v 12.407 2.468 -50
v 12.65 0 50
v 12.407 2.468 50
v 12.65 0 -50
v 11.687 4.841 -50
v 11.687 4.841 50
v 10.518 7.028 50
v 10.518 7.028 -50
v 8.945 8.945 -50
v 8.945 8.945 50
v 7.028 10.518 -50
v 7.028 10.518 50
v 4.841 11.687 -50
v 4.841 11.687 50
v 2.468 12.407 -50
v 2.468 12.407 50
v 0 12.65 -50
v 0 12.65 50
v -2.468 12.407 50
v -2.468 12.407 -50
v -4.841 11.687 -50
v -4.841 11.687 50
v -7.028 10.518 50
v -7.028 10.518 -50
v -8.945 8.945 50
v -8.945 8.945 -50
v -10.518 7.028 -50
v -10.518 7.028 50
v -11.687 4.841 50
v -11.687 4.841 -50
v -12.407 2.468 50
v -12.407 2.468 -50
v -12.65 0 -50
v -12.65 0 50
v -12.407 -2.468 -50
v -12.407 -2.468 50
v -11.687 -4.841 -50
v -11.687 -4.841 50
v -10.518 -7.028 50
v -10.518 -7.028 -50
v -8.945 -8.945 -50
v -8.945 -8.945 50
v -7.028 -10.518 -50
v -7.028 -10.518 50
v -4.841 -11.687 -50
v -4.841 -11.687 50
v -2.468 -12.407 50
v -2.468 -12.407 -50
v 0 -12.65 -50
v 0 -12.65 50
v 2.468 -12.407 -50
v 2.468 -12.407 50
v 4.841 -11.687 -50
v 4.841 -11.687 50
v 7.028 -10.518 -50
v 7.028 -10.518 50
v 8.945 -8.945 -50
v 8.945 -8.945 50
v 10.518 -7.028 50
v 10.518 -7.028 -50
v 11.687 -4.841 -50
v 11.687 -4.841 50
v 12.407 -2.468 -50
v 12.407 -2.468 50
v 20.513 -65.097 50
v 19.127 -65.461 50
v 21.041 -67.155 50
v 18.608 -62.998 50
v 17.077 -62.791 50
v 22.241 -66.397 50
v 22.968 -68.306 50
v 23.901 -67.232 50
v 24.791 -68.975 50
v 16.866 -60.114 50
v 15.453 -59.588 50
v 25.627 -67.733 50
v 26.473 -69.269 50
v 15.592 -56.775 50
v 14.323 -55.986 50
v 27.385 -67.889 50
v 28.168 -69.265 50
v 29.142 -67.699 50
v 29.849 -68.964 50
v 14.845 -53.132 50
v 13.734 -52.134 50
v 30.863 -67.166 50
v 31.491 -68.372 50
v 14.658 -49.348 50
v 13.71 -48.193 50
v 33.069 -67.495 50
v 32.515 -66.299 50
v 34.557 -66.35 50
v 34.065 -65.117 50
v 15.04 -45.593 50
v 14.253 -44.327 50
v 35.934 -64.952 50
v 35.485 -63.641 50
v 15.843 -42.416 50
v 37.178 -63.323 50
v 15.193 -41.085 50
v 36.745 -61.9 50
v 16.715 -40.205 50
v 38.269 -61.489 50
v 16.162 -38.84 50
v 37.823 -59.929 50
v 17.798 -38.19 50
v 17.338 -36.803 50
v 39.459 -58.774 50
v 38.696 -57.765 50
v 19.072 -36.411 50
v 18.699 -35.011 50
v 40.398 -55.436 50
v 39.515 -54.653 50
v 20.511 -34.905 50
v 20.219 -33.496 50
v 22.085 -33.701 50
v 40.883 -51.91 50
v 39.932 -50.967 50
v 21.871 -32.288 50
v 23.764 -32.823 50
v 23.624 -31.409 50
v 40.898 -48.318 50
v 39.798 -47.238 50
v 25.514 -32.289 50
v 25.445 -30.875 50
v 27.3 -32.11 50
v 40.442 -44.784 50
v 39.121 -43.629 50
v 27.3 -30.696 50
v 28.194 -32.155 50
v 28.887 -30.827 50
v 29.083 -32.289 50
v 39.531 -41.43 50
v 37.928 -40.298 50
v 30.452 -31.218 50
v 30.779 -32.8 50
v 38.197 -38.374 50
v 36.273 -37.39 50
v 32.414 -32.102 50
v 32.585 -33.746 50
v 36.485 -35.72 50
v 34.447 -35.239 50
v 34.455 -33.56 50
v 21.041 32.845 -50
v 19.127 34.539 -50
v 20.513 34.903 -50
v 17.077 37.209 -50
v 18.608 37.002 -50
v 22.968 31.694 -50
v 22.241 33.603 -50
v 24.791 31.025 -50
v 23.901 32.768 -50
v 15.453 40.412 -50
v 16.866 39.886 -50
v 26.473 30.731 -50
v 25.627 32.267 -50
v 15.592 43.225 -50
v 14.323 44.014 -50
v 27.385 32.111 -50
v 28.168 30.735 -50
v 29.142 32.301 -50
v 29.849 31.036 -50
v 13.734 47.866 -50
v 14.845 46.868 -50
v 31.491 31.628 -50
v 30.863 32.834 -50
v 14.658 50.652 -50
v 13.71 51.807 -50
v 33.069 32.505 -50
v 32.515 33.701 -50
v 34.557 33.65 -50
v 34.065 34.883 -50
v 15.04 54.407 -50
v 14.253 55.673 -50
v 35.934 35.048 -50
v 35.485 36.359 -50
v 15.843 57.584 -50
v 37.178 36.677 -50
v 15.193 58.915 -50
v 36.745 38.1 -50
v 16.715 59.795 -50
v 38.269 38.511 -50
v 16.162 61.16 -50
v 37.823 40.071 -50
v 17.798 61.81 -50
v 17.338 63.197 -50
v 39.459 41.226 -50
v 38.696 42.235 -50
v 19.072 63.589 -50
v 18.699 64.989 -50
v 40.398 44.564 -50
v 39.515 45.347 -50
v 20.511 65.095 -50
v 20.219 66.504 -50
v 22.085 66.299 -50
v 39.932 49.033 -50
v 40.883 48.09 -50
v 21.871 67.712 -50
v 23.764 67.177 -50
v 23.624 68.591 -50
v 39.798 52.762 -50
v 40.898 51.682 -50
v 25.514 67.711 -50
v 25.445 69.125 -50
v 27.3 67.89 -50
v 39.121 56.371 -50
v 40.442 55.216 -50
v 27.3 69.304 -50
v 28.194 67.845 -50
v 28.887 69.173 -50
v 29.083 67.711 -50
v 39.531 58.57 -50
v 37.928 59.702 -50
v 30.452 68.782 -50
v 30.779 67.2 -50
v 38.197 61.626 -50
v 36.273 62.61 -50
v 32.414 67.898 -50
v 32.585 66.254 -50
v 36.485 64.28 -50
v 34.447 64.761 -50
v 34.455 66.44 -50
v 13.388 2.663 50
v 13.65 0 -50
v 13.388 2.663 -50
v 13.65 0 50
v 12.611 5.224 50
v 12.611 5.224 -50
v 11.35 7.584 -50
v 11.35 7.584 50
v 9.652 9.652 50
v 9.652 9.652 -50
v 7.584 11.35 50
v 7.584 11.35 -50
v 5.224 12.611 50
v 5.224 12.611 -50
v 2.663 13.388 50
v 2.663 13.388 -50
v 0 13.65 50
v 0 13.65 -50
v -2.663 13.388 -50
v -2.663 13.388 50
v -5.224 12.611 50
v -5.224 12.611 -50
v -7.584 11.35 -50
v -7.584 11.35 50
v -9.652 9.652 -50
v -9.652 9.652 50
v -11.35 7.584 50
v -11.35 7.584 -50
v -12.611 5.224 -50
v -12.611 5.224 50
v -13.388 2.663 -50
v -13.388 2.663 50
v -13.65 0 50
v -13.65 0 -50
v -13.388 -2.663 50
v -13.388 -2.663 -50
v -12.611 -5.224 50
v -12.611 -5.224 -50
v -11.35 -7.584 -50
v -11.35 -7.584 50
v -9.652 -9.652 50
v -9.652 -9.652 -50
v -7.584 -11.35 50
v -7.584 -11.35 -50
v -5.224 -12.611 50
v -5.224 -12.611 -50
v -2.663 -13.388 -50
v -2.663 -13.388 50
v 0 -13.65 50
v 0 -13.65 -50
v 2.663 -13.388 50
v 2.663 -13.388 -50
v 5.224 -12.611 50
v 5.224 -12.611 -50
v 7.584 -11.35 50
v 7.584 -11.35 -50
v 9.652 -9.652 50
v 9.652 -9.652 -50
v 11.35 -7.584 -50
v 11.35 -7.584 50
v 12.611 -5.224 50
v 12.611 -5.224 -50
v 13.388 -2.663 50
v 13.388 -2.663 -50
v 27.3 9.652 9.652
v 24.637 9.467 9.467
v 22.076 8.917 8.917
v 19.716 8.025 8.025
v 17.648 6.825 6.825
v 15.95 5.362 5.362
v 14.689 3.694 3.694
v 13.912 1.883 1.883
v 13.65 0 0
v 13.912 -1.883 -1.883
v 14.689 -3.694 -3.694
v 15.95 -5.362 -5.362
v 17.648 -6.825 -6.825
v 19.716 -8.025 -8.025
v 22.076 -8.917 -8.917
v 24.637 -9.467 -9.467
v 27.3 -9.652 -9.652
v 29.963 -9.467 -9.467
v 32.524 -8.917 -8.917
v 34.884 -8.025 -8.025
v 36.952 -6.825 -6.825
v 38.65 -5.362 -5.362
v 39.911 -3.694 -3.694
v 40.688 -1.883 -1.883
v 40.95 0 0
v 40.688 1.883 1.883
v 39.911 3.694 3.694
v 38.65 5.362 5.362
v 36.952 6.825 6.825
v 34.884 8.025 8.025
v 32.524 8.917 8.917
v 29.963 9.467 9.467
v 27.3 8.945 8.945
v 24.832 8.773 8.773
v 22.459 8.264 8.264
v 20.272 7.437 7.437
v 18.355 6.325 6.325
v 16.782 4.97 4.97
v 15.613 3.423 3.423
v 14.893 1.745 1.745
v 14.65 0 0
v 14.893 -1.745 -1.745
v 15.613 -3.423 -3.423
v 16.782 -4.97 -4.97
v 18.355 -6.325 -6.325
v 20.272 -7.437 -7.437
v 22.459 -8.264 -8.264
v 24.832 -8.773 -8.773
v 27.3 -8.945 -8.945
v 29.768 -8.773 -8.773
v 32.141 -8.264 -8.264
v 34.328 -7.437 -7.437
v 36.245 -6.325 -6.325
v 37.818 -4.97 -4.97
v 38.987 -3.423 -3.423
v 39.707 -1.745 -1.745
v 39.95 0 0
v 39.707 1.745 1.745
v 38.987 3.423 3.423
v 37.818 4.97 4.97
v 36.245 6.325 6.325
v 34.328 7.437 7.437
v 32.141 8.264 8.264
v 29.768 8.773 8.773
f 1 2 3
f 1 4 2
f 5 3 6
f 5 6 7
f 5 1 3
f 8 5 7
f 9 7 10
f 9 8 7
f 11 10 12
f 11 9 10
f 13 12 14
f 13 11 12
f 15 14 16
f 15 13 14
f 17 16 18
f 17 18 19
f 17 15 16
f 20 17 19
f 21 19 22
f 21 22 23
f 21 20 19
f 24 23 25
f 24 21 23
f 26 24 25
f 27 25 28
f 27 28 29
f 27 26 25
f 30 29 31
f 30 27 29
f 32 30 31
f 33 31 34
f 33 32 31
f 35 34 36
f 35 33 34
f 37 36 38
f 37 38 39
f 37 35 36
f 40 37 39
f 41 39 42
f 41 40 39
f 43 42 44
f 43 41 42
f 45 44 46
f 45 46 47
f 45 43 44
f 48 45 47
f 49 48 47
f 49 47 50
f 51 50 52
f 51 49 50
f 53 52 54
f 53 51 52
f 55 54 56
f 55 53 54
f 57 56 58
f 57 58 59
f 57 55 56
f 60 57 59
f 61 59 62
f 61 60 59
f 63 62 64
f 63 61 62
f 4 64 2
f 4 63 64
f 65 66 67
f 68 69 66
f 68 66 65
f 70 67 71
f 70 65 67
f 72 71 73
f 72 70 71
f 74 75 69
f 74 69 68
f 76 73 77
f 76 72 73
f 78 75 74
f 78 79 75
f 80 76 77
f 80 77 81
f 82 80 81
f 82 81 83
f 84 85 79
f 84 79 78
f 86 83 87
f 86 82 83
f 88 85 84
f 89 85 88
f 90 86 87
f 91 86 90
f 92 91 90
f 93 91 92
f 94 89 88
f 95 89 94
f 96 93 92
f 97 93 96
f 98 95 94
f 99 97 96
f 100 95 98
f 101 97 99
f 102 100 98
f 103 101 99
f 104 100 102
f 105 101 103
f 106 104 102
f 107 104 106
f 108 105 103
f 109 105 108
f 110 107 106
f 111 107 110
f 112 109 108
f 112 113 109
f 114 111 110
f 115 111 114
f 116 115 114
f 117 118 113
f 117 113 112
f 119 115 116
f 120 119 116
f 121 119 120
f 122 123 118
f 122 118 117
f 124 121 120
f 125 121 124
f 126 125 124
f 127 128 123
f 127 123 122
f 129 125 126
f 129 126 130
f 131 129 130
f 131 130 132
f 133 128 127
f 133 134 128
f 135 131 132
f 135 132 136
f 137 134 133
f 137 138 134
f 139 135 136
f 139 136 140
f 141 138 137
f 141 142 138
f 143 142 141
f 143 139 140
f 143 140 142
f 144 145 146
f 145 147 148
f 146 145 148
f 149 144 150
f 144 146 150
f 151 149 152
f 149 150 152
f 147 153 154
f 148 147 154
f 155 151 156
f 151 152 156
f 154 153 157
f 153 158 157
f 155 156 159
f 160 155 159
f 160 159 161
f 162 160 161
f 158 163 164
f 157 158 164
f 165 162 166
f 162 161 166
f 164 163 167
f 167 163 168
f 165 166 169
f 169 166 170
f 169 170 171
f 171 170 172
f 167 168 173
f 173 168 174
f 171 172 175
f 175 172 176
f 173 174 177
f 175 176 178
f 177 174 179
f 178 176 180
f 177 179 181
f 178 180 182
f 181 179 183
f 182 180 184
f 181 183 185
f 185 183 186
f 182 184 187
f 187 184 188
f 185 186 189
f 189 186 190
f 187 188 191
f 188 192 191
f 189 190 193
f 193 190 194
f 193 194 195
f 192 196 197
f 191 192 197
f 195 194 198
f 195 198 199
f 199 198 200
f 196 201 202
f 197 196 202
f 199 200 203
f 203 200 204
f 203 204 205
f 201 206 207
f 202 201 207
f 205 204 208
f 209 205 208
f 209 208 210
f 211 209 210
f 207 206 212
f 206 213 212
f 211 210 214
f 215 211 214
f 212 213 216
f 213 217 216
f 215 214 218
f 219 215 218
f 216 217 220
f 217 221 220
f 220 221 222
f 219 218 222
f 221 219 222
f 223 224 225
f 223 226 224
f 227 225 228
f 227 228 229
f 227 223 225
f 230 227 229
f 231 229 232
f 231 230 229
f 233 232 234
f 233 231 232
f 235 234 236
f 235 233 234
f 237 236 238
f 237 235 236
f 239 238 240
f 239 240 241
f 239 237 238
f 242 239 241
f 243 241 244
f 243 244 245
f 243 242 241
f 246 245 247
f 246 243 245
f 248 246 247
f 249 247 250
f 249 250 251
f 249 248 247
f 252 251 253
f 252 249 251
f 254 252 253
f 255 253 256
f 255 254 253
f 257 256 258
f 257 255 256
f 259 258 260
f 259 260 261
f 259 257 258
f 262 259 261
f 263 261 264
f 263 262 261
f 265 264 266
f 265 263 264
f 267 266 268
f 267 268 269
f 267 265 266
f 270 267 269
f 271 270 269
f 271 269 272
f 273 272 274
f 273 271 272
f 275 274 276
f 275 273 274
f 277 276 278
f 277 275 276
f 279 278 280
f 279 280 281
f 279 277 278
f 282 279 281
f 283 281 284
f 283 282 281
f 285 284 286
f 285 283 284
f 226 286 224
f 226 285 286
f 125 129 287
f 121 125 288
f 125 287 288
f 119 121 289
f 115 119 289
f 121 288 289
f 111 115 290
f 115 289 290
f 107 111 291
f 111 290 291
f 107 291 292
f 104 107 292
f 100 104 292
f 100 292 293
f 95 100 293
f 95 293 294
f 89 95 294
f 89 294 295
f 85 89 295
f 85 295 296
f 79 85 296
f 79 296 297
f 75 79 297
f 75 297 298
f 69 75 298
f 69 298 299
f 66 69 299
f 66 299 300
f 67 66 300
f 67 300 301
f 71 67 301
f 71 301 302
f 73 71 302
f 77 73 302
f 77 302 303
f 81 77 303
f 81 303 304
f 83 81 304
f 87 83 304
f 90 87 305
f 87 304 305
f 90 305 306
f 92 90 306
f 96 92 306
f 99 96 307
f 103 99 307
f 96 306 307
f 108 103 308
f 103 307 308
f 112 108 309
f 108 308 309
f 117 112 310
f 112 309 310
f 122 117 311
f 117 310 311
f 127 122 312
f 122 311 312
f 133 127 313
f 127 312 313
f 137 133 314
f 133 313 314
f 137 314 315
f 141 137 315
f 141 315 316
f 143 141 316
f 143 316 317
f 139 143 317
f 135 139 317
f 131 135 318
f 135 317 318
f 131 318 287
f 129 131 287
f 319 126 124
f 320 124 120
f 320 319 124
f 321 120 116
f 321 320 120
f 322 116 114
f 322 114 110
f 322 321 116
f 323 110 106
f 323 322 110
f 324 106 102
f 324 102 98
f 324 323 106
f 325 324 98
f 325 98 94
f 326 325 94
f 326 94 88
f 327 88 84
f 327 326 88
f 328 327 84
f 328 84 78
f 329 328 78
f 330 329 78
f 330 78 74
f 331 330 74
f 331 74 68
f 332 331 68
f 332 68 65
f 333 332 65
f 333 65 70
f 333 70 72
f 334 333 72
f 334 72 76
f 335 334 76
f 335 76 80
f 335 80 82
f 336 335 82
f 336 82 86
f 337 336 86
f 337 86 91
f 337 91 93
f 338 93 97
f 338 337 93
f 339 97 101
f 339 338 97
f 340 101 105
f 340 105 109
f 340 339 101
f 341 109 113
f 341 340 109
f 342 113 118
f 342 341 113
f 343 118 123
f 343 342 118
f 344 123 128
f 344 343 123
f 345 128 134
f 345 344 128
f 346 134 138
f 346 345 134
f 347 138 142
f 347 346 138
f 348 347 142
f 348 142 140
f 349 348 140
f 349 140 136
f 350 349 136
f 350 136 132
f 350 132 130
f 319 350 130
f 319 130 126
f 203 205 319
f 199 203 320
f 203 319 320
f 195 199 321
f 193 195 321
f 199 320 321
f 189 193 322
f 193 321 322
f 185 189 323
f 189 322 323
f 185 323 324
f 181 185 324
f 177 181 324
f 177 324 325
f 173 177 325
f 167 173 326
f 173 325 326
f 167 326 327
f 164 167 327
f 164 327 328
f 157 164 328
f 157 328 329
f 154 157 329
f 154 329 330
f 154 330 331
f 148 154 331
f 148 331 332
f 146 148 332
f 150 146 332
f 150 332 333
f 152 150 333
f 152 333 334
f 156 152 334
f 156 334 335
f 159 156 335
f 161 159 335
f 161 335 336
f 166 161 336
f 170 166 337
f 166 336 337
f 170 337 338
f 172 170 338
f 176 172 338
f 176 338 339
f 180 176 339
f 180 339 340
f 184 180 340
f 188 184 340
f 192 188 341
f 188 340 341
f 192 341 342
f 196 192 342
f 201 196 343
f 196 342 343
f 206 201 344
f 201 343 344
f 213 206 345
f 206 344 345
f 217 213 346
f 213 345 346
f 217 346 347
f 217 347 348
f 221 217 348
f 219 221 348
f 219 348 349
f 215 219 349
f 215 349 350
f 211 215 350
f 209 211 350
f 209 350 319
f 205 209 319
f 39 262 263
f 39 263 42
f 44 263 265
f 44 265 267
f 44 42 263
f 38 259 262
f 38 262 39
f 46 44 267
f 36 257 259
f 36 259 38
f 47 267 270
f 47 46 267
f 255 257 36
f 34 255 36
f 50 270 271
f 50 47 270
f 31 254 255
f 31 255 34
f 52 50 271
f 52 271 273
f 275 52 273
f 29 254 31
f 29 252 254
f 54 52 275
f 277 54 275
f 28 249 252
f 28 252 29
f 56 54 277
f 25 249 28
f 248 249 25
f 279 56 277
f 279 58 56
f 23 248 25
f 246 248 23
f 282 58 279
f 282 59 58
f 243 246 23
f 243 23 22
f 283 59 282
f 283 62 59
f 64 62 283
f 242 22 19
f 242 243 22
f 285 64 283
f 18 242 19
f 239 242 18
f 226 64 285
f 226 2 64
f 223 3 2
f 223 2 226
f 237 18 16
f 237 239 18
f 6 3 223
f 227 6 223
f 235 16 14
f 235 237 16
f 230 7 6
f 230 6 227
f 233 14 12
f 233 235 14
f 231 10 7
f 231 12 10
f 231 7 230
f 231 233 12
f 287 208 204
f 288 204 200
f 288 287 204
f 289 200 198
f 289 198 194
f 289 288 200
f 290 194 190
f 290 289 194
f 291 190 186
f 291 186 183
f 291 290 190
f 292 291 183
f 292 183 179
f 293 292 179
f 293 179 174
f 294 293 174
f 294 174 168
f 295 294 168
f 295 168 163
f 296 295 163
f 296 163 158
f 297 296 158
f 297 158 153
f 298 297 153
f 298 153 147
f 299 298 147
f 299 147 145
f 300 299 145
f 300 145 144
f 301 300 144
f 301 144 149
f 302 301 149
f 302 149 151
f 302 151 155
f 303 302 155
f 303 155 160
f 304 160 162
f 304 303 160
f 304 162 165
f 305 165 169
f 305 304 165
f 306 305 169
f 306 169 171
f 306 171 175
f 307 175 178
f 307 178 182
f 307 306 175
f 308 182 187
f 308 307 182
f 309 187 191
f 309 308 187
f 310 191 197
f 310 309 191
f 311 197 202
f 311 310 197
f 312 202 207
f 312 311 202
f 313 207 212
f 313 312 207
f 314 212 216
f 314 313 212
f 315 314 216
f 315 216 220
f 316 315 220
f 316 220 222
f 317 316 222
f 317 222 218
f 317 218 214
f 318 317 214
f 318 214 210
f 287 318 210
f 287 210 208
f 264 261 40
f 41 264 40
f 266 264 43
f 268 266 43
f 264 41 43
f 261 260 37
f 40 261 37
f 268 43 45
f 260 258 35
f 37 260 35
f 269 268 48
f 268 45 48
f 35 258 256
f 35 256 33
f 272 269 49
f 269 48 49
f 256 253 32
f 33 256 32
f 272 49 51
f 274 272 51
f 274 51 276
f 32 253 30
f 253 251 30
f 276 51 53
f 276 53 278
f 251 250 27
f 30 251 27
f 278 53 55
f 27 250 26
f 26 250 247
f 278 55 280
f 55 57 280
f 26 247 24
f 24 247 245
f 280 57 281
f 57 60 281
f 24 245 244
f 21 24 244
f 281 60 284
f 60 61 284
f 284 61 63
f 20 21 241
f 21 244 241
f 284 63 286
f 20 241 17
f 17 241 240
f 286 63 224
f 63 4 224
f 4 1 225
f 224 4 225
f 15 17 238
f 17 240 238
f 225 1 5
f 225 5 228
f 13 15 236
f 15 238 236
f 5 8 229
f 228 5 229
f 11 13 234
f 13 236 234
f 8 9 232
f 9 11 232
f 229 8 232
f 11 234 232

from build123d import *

# Parameters (mm, degrees)
ESQUISSE1_R                    = 13.65
ESQUISSE1_R_2                  = 12.65
BOSS_EXTRU_1_DEPTH             = 50
BOSS_EXTRU_6_REACH             = 85.361
ESQUISSE15_R                   = 13.65
ESQUISSE15_R_2                 = 12.65
BOSS_EXTRU_6_DIRECTION_2_REACH = 85.361


with BuildPart() as part:
    # Esquisse1 → Boss.-Extru.1 (new, symmetric)
    with BuildSketch(Plane.XY):
        Circle(ESQUISSE1_R)
        Circle(ESQUISSE1_R_2, mode=Mode.SUBTRACT)
    extrude(amount=BOSS_EXTRU_1_DEPTH, both=True)


with BuildPart() as body_2:
    # Boss.-Extru.6: up to this plane
    boss_extru_6_end = Plane(origin=(0, 0, 50), z_dir=(0, 0, 1))
    # Esquisse15 → Boss.-Extru.6 (new, up to the surface)
    with BuildSketch(Plane(origin=(0, 0, 0), x_dir=(1, 0, 0), z_dir=(0, -0.7071067811865488, 0.7071067811865464)), mode=Mode.PRIVATE) as boss_extru_6_sk1:
        with Locations(Location((27.3, 0, 0), (0, 0, 90))):
            Circle(ESQUISSE15_R)
        with Locations(Location((27.3, 0, 0), (0, 0, 90))):
            Circle(ESQUISSE15_R_2, mode=Mode.SUBTRACT)
    boss_extru_6_tool1 = split(extrude(boss_extru_6_sk1.sketch, amount=BOSS_EXTRU_6_REACH, mode=Mode.PRIVATE), bisect_by=boss_extru_6_end, keep=Keep.BOTH, mode=Mode.PRIVATE)
    add(boss_extru_6_tool1.solids().sort_by_distance((27.3, -9.379008, -9.379008))[0])

    # Boss.-Extru.6 direction 2: up to this plane
    boss_extru_6_direction_2_end = Plane(origin=(0, 0, -50), z_dir=(0, 0, 1))
    # Esquisse15 → Boss.-Extru.6 direction 2 (add, up to the surface)
    with BuildSketch(Plane(origin=(0, 0, 0), x_dir=(1, 0, 0), z_dir=(0, -0.7071067811865488, 0.7071067811865464)), mode=Mode.PRIVATE) as boss_extru_6_direction_2_sk1:
        with Locations(Location((27.3, 0, 0), (0, 0, 90))):
            Circle(ESQUISSE15_R)
        with Locations(Location((27.3, 0, 0), (0, 0, 90))):
            Circle(ESQUISSE15_R_2, mode=Mode.SUBTRACT)
    boss_extru_6_direction_2_tool1 = split(extrude(boss_extru_6_direction_2_sk1.sketch, amount=-BOSS_EXTRU_6_DIRECTION_2_REACH, mode=Mode.PRIVATE), bisect_by=boss_extru_6_direction_2_end, keep=Keep.BOTH, mode=Mode.PRIVATE)
    add(boss_extru_6_direction_2_tool1.solids().sort_by_distance((27.3, -9.379008, -9.379008))[0])


solid = Compound([part.part, body_2.part])
